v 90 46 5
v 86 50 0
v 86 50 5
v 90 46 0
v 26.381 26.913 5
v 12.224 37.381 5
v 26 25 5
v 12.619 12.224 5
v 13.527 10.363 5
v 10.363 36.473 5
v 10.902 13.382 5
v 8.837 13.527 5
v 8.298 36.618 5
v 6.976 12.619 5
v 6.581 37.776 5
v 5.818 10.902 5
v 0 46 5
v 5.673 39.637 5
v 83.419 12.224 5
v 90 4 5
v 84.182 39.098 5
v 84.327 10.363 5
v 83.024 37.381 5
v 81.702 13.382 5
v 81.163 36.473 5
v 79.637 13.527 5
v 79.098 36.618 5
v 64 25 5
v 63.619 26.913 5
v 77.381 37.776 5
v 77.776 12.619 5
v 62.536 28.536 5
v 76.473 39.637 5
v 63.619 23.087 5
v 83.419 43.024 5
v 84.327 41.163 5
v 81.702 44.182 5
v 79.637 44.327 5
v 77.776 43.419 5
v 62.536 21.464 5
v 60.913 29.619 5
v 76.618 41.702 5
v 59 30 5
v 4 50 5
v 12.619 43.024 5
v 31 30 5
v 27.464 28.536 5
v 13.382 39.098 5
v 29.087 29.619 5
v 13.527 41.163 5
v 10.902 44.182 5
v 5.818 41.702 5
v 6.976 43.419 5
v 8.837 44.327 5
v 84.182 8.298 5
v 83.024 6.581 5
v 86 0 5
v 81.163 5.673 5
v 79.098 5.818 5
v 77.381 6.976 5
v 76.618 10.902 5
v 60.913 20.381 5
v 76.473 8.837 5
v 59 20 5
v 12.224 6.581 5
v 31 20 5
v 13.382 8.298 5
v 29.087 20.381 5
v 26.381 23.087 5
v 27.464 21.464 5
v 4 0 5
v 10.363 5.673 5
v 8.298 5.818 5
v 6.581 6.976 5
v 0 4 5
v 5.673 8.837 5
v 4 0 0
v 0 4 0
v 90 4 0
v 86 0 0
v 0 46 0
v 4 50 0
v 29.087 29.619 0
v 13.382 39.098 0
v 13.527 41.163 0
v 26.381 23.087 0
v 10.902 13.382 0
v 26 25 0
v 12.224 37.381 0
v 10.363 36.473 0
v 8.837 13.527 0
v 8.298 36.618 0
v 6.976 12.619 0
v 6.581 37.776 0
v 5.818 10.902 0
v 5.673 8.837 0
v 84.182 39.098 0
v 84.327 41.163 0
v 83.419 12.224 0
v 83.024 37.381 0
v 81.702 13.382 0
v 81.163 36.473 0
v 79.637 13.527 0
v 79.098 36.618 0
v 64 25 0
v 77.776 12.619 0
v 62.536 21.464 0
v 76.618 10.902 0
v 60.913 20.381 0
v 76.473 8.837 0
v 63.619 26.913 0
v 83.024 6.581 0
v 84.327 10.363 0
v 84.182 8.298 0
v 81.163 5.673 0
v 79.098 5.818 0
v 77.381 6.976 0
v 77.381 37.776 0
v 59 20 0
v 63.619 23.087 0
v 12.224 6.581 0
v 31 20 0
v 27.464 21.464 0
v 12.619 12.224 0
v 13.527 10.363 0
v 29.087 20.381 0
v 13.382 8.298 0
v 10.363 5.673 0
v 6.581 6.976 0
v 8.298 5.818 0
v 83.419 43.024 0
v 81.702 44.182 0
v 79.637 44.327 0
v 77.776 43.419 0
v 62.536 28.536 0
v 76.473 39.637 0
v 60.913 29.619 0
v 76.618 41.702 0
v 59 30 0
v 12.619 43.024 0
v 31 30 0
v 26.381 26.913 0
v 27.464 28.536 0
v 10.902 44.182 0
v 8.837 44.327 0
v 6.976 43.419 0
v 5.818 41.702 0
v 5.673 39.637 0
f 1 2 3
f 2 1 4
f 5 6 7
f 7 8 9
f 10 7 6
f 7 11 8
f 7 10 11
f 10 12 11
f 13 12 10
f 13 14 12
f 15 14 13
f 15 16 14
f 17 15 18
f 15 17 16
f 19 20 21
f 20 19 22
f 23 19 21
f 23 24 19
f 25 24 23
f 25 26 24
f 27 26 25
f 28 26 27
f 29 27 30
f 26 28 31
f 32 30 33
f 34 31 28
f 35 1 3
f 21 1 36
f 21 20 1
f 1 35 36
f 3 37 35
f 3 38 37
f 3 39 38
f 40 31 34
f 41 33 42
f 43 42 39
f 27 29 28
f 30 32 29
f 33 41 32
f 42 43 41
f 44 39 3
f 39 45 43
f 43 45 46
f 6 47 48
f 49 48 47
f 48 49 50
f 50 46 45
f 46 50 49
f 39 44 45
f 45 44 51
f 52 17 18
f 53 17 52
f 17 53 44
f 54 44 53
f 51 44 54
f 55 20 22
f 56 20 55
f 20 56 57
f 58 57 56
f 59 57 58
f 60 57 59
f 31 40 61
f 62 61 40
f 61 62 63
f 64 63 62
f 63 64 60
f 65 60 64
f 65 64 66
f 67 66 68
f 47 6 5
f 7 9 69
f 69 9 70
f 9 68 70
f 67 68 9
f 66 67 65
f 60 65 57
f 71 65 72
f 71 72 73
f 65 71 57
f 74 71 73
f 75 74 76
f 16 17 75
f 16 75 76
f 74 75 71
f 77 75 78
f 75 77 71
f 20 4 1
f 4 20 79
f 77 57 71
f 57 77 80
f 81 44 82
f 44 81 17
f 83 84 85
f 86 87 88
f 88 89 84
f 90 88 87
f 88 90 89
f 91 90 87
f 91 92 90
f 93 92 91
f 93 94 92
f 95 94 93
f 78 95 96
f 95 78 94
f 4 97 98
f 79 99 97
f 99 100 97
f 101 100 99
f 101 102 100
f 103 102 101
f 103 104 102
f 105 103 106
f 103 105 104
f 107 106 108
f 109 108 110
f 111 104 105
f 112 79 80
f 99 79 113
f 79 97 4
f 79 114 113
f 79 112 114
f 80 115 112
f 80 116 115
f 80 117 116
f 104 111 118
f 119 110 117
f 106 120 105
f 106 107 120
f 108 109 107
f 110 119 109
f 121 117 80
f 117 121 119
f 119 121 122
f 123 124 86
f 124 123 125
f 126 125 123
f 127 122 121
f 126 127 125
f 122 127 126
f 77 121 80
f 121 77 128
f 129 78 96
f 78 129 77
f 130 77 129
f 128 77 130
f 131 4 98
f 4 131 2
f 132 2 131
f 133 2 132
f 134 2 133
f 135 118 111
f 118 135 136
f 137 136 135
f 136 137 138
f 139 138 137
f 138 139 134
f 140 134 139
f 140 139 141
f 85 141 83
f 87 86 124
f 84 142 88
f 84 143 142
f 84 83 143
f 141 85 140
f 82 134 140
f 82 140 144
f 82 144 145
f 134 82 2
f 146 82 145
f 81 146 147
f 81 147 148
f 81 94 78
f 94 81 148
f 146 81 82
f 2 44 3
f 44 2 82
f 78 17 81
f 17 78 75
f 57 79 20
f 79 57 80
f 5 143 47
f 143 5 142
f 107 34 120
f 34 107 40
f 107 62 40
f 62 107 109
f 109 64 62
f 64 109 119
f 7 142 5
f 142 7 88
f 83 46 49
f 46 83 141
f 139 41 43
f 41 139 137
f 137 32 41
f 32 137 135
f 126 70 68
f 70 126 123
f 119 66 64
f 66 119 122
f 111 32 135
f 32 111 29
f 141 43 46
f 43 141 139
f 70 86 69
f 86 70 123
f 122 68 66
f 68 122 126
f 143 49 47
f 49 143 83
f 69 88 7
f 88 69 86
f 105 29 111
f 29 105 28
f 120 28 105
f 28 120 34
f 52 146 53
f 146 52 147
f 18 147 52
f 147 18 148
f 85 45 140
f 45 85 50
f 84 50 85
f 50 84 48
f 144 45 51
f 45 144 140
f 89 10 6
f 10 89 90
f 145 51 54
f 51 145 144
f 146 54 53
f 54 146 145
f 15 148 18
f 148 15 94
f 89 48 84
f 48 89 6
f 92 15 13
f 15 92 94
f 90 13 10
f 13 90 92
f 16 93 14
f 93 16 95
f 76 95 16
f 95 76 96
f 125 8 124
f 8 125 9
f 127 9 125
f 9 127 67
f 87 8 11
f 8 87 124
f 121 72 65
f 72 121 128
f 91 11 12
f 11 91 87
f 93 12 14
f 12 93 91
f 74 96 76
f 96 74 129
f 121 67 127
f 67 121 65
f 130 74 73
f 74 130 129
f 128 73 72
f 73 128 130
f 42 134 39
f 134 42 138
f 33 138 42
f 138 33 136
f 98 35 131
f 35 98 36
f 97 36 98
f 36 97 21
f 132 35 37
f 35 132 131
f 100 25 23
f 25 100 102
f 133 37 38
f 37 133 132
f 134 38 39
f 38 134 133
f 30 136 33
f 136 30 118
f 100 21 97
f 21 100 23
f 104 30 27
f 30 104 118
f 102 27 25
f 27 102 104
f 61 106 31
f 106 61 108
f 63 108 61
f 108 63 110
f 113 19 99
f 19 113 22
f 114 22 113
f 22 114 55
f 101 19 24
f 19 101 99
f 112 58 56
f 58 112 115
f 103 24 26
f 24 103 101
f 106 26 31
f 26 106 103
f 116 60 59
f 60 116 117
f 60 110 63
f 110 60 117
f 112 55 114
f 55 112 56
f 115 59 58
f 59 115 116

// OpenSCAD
$fn = 32;

// ----------------------------------------------------------------------
// Bracket plate: slot plate 90 x 50
// ----------------------------------------------------------------------

// --- parameters (mm) ---
hole_r = 4;               // bolt hole radius
plate_t = 5;              // plate thickness, Z (extrusion height)
plate_l = 90;             // plate length
plate_w = 50;             // plate width
slot_l = 28;              // slot straight length
slot_r = 5;               // slot end radius

slot_len = slot_l + 2 * slot_r;
slot_w = 2 * slot_r;
hole_d2 = 2 * hole_r;

profile = [[4, 0], [86, 0], [90, 4], [90, 46], [86, 50], [4, 50], [0, 46], [0, 4]];  // primary outline, 8 points, counter clockwise
void_1 = [[59, 20], [60.913, 20.381], [62.536, 21.464], [63.619, 23.087], [64, 25], [63.619, 26.913], [62.536, 28.536], [60.913, 29.619], [59, 30], [31, 30], [29.087, 29.619], [27.464, 28.536], [26.381, 26.913], [26, 25], [26.381, 23.087], [27.464, 21.464], [29.087, 20.381], [31, 20]];  // grip slot, 18 points
void_2 = [[13.527, 41.163], [12.619, 43.024], [10.902, 44.182], [8.837, 44.327], [6.976, 43.419], [5.818, 41.702], [5.673, 39.637], [6.581, 37.776], [8.298, 36.618], [10.363, 36.473], [12.224, 37.381], [13.382, 39.098]];  // corner hole, 12 points
void_3 = [[13.527, 10.363], [12.619, 12.224], [10.902, 13.382], [8.837, 13.527], [6.976, 12.619], [5.818, 10.902], [5.673, 8.837], [6.581, 6.976], [8.298, 5.818], [10.363, 5.673], [12.224, 6.581], [13.382, 8.298]];  // corner hole, 12 points
void_4 = [[84.327, 41.163], [83.419, 43.024], [81.702, 44.182], [79.637, 44.327], [77.776, 43.419], [76.618, 41.702], [76.473, 39.637], [77.381, 37.776], [79.098, 36.618], [81.163, 36.473], [83.024, 37.381], [84.182, 39.098]];  // corner hole, 12 points
void_5 = [[84.327, 10.363], [83.419, 12.224], [81.702, 13.382], [79.637, 13.527], [77.776, 12.619], [76.618, 10.902], [76.473, 8.837], [77.381, 6.976], [79.098, 5.818], [81.163, 5.673], [83.024, 6.581], [84.182, 8.298]];  // corner hole, 12 points

// --- the one profile operation ---
difference() {
  linear_extrude(height = plate_t) polygon(points = profile);
  translate([0, 0, -1])
    linear_extrude(height = plate_t + 2) polygon(points = void_1);
  translate([0, 0, -1])
    linear_extrude(height = plate_t + 2) polygon(points = void_2);
  translate([0, 0, -1])
    linear_extrude(height = plate_t + 2) polygon(points = void_3);
  translate([0, 0, -1])
    linear_extrude(height = plate_t + 2) polygon(points = void_4);
  translate([0, 0, -1])
    linear_extrude(height = plate_t + 2) polygon(points = void_5);
}
